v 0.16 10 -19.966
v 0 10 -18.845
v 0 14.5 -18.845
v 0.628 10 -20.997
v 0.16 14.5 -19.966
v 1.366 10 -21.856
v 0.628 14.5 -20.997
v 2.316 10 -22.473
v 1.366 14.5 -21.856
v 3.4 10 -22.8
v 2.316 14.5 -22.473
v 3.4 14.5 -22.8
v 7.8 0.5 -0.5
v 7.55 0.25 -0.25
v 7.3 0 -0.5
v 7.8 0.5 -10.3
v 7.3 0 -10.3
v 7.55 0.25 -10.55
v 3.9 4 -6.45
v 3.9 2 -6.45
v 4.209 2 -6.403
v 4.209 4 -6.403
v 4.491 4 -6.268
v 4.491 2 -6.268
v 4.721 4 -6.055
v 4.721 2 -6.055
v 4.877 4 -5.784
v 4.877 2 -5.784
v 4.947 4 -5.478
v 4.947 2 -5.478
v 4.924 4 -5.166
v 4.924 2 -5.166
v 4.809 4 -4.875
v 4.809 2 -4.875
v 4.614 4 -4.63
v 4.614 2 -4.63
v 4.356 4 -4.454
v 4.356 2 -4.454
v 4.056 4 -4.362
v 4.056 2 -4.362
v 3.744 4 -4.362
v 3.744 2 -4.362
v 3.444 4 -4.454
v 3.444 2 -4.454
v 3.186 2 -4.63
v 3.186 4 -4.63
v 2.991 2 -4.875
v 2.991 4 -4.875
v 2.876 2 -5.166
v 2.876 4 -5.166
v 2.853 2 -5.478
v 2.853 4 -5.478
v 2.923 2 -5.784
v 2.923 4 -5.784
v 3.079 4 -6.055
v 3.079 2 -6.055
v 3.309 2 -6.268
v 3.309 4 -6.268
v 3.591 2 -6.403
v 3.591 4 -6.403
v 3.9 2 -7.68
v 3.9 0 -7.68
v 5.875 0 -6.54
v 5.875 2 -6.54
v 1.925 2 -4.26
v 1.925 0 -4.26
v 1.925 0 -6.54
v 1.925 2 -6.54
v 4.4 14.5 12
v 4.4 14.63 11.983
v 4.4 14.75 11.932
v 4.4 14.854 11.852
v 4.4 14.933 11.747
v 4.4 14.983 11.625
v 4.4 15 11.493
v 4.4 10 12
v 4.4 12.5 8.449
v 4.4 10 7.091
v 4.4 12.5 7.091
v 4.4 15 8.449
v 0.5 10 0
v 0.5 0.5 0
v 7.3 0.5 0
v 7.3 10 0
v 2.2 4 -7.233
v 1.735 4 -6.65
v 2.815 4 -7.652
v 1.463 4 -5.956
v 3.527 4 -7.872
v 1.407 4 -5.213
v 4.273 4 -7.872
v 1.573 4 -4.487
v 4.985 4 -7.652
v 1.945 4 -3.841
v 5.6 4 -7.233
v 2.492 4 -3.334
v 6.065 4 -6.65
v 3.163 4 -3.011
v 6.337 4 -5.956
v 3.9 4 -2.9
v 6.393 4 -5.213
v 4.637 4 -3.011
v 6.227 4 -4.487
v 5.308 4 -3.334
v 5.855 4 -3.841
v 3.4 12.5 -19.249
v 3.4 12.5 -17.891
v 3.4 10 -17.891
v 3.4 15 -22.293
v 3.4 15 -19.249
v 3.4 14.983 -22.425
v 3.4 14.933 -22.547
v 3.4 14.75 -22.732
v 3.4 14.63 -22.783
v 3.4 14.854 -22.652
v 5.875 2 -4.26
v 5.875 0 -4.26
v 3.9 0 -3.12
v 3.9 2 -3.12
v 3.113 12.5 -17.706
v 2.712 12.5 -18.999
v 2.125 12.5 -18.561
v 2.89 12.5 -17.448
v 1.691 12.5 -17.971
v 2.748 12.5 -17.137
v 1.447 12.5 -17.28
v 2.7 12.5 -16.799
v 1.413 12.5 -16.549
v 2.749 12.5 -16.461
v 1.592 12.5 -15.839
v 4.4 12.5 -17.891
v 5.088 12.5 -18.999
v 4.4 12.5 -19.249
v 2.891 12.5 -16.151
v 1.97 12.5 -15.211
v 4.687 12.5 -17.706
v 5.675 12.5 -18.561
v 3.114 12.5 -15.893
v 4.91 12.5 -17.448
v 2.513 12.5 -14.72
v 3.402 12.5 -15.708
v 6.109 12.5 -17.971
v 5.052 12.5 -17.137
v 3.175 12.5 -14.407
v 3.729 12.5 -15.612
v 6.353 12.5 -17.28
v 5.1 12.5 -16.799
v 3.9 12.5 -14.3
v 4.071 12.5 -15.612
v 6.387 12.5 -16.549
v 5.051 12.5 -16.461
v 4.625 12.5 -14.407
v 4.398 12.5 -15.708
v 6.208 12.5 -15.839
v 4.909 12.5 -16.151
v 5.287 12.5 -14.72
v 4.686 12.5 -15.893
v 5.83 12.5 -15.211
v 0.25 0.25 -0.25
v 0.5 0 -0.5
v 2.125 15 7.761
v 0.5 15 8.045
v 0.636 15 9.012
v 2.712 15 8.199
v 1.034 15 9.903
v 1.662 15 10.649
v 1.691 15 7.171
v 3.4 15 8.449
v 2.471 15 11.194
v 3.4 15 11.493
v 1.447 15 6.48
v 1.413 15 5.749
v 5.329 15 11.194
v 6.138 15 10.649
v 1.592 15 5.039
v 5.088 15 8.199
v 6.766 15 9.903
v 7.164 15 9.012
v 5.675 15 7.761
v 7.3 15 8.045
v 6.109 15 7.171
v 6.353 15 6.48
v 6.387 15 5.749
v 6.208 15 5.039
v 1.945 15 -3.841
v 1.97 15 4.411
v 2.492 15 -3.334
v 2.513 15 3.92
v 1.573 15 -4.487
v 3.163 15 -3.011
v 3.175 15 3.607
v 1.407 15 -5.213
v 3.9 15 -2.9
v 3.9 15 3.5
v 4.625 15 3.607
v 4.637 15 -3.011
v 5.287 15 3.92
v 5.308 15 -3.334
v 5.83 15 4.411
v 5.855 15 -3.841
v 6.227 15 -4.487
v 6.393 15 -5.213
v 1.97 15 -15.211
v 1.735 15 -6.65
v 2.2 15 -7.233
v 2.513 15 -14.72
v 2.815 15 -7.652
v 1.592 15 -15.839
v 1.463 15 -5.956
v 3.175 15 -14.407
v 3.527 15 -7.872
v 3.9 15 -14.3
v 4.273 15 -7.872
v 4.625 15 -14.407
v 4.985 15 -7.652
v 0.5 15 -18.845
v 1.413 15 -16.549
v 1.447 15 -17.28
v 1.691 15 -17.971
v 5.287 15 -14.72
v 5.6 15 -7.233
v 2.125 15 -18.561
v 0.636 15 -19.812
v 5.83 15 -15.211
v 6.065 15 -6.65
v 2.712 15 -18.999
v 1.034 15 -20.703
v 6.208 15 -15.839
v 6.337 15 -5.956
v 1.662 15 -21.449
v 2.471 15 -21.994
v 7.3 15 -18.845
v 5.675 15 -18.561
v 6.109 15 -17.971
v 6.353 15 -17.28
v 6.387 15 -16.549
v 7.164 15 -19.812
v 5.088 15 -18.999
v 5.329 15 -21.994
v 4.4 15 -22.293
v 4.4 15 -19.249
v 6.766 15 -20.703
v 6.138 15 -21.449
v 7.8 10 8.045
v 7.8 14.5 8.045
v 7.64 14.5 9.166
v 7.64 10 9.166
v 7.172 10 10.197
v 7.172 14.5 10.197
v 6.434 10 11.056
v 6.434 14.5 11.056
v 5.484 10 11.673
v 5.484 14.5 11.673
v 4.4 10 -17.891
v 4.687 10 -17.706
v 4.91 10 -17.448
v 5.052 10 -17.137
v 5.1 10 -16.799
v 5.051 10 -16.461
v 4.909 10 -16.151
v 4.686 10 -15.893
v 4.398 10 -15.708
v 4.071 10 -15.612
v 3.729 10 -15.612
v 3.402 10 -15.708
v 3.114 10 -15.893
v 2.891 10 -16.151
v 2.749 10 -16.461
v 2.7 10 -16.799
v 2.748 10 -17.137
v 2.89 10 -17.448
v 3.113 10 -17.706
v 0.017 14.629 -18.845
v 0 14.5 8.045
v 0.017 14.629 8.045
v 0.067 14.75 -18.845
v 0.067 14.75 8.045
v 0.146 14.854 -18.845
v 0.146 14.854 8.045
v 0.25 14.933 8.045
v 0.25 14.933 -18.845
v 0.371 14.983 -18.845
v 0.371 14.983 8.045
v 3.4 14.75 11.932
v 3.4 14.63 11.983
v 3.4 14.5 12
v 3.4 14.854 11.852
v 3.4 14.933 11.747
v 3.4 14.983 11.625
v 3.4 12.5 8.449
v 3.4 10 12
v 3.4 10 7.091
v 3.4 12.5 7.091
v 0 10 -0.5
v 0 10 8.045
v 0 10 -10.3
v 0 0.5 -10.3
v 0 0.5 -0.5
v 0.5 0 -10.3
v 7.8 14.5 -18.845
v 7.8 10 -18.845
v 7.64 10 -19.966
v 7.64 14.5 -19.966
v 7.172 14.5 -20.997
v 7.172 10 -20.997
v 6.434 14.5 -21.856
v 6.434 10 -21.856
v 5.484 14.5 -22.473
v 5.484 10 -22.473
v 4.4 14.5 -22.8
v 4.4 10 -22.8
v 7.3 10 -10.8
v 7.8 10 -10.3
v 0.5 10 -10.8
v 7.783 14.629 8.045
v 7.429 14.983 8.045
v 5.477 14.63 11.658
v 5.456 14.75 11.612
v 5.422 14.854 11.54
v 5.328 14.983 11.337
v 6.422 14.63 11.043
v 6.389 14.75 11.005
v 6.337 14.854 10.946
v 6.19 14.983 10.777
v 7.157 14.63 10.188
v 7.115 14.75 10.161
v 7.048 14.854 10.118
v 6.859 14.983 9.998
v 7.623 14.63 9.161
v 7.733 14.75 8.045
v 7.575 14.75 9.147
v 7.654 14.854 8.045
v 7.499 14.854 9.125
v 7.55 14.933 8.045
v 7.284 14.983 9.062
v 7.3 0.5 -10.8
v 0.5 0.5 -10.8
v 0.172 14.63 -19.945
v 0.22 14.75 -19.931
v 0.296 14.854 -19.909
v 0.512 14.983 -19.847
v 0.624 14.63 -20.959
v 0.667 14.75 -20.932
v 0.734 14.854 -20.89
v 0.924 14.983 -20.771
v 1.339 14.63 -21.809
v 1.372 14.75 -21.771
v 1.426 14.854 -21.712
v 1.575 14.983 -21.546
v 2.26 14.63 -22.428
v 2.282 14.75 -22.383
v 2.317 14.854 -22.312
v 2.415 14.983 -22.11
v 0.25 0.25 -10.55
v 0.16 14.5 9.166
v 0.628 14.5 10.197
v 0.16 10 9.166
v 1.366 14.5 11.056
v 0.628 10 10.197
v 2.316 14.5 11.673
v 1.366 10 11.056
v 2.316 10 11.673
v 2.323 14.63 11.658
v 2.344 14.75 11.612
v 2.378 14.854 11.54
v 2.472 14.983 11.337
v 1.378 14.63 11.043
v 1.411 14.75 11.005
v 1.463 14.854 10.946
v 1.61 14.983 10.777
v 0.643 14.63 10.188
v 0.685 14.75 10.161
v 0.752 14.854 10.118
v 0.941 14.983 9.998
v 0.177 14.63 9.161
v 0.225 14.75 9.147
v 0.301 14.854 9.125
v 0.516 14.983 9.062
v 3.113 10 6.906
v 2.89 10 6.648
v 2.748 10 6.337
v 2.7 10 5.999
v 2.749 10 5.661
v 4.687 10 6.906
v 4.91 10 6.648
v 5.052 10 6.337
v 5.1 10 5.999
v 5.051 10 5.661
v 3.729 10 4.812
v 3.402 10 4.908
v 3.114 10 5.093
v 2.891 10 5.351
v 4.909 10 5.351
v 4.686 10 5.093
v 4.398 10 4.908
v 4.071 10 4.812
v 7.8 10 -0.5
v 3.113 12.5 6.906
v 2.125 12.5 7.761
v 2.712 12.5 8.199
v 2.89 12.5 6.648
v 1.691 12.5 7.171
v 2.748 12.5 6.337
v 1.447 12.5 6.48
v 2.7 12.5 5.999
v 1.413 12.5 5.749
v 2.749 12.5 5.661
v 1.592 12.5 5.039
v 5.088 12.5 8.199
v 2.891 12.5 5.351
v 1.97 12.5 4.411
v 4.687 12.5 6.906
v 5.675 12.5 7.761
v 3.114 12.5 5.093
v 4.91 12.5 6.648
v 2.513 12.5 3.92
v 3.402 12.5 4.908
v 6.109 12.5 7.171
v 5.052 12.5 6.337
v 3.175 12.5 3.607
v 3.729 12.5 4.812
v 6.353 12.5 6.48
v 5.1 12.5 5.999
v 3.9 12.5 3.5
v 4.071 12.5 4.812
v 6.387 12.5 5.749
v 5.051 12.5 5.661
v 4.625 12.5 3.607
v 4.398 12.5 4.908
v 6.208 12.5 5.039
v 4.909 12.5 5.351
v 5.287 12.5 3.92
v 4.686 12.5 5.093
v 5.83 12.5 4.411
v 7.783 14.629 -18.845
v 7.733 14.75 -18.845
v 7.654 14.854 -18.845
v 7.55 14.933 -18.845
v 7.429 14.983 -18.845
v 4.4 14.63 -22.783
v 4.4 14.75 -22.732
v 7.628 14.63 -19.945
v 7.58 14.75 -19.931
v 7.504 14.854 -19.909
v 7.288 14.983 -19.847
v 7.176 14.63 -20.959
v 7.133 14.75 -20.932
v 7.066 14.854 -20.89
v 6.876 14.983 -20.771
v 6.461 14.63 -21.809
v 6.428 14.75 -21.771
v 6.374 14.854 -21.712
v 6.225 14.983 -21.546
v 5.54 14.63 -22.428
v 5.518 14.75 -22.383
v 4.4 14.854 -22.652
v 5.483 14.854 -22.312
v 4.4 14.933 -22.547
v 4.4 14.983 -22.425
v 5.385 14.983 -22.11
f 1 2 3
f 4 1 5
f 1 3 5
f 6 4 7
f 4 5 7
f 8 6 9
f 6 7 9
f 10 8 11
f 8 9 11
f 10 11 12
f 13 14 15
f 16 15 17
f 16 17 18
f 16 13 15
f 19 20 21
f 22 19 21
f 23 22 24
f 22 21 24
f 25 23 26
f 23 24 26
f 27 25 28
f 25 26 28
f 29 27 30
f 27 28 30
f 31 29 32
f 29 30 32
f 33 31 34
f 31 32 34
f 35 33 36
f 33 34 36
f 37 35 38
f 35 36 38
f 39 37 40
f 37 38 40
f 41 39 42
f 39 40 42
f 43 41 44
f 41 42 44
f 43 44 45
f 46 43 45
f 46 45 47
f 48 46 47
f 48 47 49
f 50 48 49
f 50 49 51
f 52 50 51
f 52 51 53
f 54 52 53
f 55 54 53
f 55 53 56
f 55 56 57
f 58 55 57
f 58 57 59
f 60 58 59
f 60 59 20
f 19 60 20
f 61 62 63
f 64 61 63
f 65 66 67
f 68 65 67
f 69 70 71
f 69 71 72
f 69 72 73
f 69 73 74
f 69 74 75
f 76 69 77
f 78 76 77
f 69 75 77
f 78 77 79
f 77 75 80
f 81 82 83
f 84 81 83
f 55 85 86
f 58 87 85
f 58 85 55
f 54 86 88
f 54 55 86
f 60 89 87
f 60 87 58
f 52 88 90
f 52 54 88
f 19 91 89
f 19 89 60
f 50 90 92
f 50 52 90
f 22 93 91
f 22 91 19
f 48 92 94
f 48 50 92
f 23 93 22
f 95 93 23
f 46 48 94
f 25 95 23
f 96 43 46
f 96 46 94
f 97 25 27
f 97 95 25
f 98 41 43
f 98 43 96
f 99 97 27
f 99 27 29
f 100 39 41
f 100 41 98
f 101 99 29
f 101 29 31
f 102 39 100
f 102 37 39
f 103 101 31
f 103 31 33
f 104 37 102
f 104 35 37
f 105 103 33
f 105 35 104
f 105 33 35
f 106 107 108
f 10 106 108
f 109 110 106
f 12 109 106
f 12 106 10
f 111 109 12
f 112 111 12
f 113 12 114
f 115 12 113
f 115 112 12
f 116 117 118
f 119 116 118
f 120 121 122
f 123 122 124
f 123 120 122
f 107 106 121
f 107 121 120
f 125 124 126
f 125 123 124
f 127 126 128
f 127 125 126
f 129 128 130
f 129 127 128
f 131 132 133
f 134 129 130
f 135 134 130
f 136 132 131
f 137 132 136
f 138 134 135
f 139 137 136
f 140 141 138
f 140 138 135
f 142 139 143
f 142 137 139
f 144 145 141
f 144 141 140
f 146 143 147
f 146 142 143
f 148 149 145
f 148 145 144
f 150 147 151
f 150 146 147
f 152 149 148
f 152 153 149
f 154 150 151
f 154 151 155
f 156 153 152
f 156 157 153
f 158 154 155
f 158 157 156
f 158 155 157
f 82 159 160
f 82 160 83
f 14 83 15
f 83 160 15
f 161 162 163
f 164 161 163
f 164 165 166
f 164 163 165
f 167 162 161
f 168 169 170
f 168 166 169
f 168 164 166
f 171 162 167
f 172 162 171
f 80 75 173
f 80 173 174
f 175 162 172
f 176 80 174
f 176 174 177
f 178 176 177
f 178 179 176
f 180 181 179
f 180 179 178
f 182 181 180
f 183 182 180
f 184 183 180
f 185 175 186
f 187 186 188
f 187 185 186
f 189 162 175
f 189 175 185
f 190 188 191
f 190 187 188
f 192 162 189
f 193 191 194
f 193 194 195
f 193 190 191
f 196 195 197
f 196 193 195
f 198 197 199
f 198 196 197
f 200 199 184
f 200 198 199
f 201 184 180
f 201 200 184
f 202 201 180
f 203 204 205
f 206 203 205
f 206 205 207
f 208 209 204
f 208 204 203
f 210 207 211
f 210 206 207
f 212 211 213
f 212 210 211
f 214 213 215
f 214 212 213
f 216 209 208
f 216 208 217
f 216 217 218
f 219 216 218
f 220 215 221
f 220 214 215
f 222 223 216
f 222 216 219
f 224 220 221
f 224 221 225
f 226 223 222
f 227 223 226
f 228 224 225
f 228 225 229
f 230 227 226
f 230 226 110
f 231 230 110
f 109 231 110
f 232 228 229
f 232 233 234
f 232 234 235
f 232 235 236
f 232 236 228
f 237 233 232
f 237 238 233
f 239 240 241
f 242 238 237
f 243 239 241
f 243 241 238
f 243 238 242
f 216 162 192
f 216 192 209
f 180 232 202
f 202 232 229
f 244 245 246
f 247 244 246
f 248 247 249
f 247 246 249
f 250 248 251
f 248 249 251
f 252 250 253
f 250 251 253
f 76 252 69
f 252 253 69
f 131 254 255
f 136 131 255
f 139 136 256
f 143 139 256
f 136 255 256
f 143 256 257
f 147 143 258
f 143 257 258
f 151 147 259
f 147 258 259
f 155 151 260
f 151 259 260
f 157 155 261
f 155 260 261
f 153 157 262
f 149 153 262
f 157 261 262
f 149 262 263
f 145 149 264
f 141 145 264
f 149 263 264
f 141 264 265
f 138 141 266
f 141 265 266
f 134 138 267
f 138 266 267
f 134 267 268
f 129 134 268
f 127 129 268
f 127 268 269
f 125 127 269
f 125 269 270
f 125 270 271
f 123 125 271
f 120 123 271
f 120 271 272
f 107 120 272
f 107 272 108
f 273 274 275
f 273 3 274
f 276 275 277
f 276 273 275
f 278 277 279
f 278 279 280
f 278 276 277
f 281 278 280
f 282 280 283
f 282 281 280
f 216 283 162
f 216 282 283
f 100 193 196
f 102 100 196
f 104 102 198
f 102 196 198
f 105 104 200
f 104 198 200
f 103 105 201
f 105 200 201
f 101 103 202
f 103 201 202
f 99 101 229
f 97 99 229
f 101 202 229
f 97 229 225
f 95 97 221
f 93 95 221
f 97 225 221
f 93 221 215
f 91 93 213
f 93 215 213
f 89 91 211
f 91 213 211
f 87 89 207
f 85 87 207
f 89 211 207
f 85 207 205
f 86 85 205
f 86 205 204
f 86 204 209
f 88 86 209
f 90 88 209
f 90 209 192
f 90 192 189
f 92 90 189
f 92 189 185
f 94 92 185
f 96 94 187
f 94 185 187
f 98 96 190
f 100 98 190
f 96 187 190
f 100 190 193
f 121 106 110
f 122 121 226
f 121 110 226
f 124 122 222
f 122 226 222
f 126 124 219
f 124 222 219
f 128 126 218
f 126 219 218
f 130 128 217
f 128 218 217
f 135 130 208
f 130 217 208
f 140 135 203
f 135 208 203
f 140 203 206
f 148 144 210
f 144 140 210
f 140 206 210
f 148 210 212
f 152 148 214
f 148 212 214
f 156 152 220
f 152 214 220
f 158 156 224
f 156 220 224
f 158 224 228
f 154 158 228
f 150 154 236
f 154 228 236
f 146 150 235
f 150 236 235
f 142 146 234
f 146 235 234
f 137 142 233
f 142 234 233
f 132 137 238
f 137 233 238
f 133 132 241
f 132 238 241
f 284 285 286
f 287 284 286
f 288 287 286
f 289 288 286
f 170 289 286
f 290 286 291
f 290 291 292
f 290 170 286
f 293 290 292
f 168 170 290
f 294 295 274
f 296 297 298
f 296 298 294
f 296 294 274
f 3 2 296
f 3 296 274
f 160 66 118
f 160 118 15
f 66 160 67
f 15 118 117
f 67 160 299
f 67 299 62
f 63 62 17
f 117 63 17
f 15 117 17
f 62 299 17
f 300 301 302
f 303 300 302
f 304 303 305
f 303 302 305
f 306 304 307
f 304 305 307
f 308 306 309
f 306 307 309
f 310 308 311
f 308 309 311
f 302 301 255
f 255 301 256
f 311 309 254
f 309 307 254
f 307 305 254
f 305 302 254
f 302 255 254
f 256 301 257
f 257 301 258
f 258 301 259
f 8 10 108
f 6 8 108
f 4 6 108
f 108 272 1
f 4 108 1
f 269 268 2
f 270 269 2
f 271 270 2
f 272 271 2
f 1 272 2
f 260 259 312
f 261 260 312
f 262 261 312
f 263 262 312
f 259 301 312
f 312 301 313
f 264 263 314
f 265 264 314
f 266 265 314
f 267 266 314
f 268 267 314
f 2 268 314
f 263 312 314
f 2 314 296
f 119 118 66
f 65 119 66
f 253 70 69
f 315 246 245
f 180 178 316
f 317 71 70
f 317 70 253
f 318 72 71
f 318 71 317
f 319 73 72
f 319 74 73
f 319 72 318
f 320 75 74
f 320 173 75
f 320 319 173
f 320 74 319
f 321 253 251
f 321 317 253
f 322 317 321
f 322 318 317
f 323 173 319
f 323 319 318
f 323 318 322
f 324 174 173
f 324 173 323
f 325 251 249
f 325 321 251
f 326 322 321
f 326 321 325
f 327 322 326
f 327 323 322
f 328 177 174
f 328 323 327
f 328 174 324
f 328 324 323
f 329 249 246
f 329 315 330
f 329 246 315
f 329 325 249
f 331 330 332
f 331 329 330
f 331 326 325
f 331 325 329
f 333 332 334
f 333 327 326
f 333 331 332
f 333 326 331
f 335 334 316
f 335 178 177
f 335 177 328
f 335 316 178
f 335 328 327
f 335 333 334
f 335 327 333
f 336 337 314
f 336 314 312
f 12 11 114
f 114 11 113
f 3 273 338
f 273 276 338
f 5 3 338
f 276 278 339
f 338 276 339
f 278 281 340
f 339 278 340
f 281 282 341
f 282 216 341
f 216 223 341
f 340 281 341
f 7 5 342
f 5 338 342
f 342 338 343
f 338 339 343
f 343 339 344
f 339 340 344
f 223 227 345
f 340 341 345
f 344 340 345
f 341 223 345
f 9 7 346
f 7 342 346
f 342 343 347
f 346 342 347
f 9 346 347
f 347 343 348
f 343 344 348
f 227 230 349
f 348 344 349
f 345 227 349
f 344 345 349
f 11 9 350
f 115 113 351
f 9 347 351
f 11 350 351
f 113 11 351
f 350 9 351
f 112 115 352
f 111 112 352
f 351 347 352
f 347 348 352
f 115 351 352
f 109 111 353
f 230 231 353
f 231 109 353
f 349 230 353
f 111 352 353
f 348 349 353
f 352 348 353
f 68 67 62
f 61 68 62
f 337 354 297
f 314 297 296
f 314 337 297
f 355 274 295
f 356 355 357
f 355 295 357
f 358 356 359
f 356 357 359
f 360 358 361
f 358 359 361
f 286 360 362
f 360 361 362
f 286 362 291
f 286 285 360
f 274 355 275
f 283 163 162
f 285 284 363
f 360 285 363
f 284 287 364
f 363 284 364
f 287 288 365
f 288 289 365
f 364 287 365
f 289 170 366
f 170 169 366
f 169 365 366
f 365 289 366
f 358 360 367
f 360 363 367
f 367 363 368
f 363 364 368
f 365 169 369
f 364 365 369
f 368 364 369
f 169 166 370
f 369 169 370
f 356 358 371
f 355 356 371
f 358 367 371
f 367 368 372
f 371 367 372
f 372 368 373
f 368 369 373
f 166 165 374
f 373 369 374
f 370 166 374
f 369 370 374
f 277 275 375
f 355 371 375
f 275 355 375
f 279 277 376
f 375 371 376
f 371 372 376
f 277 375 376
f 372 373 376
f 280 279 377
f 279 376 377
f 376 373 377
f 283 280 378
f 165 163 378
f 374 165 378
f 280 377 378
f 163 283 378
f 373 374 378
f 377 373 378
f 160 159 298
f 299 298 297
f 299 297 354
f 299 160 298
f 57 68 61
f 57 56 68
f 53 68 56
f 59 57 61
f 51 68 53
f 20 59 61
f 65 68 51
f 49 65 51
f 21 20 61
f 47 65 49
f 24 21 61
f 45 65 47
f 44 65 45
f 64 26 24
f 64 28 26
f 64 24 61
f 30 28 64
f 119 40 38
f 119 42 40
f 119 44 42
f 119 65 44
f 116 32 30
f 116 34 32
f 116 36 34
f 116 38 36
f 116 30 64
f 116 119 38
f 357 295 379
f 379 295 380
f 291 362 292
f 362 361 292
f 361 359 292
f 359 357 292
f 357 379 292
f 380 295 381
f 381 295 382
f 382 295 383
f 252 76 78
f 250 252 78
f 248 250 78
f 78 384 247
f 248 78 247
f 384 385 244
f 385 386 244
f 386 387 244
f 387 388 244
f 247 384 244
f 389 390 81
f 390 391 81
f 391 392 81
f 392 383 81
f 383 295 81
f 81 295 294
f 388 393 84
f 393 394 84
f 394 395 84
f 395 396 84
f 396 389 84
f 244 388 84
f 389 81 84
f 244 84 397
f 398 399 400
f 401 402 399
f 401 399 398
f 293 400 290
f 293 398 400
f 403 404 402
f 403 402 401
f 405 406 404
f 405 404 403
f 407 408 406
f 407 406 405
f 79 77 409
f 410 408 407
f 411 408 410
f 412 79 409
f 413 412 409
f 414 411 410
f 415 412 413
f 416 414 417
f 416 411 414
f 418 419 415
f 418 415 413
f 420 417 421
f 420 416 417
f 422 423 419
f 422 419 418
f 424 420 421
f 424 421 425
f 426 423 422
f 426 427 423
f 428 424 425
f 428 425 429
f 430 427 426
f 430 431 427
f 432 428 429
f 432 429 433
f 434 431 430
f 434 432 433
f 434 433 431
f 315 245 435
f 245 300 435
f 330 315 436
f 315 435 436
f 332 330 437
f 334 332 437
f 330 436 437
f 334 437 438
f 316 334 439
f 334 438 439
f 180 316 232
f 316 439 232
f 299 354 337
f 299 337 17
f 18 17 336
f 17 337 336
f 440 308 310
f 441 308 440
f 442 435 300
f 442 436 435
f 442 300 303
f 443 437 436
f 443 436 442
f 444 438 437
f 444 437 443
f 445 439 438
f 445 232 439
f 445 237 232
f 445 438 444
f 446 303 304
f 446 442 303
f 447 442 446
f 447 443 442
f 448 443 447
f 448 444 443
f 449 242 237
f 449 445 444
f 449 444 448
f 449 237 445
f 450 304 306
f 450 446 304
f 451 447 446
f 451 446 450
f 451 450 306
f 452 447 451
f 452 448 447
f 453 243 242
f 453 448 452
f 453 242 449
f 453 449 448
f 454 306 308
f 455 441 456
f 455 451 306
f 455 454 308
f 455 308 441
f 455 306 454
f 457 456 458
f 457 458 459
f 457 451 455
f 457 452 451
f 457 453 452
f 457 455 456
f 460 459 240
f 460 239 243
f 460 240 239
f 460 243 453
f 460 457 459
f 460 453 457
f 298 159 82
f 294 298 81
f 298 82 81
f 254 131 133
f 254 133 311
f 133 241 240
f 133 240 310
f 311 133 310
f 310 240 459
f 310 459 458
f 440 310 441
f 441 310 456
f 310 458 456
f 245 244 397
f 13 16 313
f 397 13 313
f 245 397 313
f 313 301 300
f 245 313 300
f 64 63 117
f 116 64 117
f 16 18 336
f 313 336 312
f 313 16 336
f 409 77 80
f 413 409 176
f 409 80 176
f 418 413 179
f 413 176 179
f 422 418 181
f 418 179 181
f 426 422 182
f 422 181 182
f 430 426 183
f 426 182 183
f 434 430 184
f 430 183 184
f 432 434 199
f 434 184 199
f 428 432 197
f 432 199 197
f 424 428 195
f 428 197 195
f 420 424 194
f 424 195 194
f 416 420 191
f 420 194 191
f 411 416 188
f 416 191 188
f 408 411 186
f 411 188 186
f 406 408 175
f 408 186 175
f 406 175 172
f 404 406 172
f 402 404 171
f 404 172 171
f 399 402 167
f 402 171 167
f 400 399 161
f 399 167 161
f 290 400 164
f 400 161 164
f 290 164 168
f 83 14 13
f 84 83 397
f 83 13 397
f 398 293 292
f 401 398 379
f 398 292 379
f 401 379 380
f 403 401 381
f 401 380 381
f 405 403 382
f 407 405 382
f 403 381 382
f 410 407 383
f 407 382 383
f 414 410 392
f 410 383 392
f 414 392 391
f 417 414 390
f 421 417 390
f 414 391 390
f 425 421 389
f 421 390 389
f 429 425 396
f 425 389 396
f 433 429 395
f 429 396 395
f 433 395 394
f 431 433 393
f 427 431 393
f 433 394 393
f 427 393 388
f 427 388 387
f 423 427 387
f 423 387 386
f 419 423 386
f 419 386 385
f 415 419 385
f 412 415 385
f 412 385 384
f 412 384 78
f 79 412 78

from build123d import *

# Parameters (mm, degrees)
ESQUISSE1_W             = 7.8
ESQUISSE1_H             = 10.8
BOSS_EXTRU_1_DEPTH      = 15
ESQUISSE6_R             = 1.05
ENL_V_MAT_EXTRU_2_DEPTH = 21.061904197
ENL_V_MAT_EXTRU_3_DEPTH = 2
ESQUISSE8_R             = 2.5
ENL_V_MAT_EXTRU_4_DEPTH = 11
ESQUISSE9_W             = 7.8
ESQUISSE9_H             = 5
BOSS_EXTRU_2_DEPTH      = 12
ESQUISSE10_W            = 7.8
ESQUISSE10_H            = 5
BOSS_EXTRU_3_DEPTH      = 12
ESQUISSE11_R            = 1.2
ENL_V_MAT_EXTRU_5_DEPTH = 27.089844768
ESQUISSE15_W            = 1
ESQUISSE15_H            = 4.909128789
ENL_V_MAT_EXTRU_6_DEPTH = 29.384502814
ESQUISSE16_R            = 2.5
ENL_V_MAT_EXTRU_7_DEPTH = 2.5
ESQUISSE17_W            = 1
ESQUISSE17_H            = 4.91
ENL_V_MAT_EXTRU_8_DEPTH = 10
CONG_3_R                = 4
CHANFREIN1_SIZE         = 0.5
CHANFREIN2_SIZE         = 0.5
CONG_5_R                = 0.5


with BuildPart() as part:
    # Esquisse1 → Boss.-Extru.1 (new body)
    with BuildSketch(Plane(origin=(0, 0, 0), x_dir=(1, 0, 0), z_dir=(0, 1, 0))):
        with Locations((3.9, 5.4)):
            Rectangle(ESQUISSE1_W, ESQUISSE1_H)
    extrude(amount=BOSS_EXTRU_1_DEPTH)

    # Esquisse6 → Enlèv. mat.-Extru.2 (cut, through all)
    with BuildSketch(Plane.XZ):
        with Locations(Location((3.9, -5.4, 0), (0, 0, 270))):
            Circle(ESQUISSE6_R)
    extrude(amount=-ENL_V_MAT_EXTRU_2_DEPTH, mode=Mode.SUBTRACT)

    # Esquisse7 → Enlèv. mat.-Extru.3 (cut)
    with BuildSketch(Plane.XZ):
        Polygon((3.9, -7.68), (5.874537921, -6.54), (5.874537921, -4.26), (3.9, -3.12), (1.925462079, -4.26), (1.925462079, -6.54), align=None)
    extrude(amount=-ENL_V_MAT_EXTRU_3_DEPTH, mode=Mode.SUBTRACT)

    # Esquisse8 → Enlèv. mat.-Extru.4 (cut)
    with BuildSketch(Plane(origin=(0, 15, 0), x_dir=(1, 0, 0), z_dir=(0, 1, 0))):
        with Locations(Location((3.9, 5.4, 0), (0, 0, 270))):
            Circle(ESQUISSE8_R)
    extrude(amount=-ENL_V_MAT_EXTRU_4_DEPTH, mode=Mode.SUBTRACT)

    # Esquisse9 → Boss.-Extru.2 (add)
    with BuildSketch(Plane(origin=(0, 0, -10.8), x_dir=(-1, 0, 0), z_dir=(0, 0, -1))):
        with Locations((-3.9, 12.5)):
            Rectangle(ESQUISSE9_W, ESQUISSE9_H)
    extrude(amount=BOSS_EXTRU_2_DEPTH)

    # Esquisse10 → Boss.-Extru.3 (add)
    with BuildSketch(Plane.XY):
        with Locations((3.9, 12.5)):
            Rectangle(ESQUISSE10_W, ESQUISSE10_H)
    extrude(amount=BOSS_EXTRU_3_DEPTH)

    # Esquisse11 → Enlèv. mat.-Extru.5 (cut, through all)
    with BuildSketch(Plane.XZ.offset(-10)):
        with Locations(Location((3.9, -16.8, 0), (0, 0, 270))):
            Circle(ESQUISSE11_R)
        with Locations(Location((3.9, 6, 0), (0, 0, 270))):
            Circle(ESQUISSE11_R)
    extrude(amount=-ENL_V_MAT_EXTRU_5_DEPTH, mode=Mode.SUBTRACT)

    # Esquisse15 → Enlèv. mat.-Extru.6 (cut, through all)
    with BuildSketch(Plane(origin=(0, 15, 0), x_dir=(1, 0, 0), z_dir=(0, 1, 0))):
        with Locations((3.9, -9.545435605)):
            Rectangle(ESQUISSE15_W, ESQUISSE15_H)
    extrude(amount=-ENL_V_MAT_EXTRU_6_DEPTH, mode=Mode.SUBTRACT)

    # Esquisse16 → Enlèv. mat.-Extru.7 (cut)
    with BuildSketch(Plane(origin=(0, 15, 0), x_dir=(1, 0, 0), z_dir=(0, 1, 0))):
        with Locations(Location((3.9, 16.8, 0), (0, 0, 270))):
            Circle(ESQUISSE16_R)
        with Locations((3.9, -6)):
            Circle(ESQUISSE16_R)
    extrude(amount=-ENL_V_MAT_EXTRU_7_DEPTH, mode=Mode.SUBTRACT)

    # Esquisse17 → Enlèv. mat.-Extru.8 (cut)
    with BuildSketch(Plane(origin=(0, 15, 0), x_dir=(1, 0, 0), z_dir=(0, 1, 0))):
        with Locations((3.9, 20.345)):
            Rectangle(ESQUISSE17_W, ESQUISSE17_H)
    extrude(amount=-ENL_V_MAT_EXTRU_8_DEPTH, mode=Mode.SUBTRACT)

    # Congé3
    # the kernel refuses this fillet: 4 mm, written as the material it takes off along each edge
    with BuildSketch(Plane(origin=(7.8, 24.886859967, 12), x_dir=(-1, 0, 0), z_dir=(0, -1, 0)), Plane(origin=(7.8, 0.113140033, -22.8), x_dir=(-1, 0, 0), z_dir=(0, 1, 0))) as cong_3_piece_1:
        with BuildLine():
            CenterArc((4, 3.954743987), CONG_3_R, 180, 81.373073441)
            Line((0, 3.954743987), (-0.08, 3.954743987))
            Line((-0.08, 3.954743987), (-0.08, 0))
            Line((-0.08, 0), (0, -0.08))
            ThreePointArc((0, -0.08), (1.7, -0.08), (3.388, -0.07909488))
            Line((3.388, -0.07909488), (3.4, 0))
        make_face()
    extrude(amount=24.773719933, mode=Mode.SUBTRACT)
    with BuildSketch(Plane(origin=(0, 0.113140033, 12), x_dir=(0, 0, -1), z_dir=(0, 1, 0)), Plane(origin=(0, 24.886859967, -22.8), x_dir=(0, 0, 1), z_dir=(0, -1, 0))) as cong_3_piece_2:
        with BuildLine():
            CenterArc((3.954743987, -4), CONG_3_R, 90, 81.373073441)
            Line((0, -3.4), (-0.07909488, -3.388))
            ThreePointArc((-0.07909488, -3.388), (-0.08, -1.7), (-0.08, 0))
            Line((-0.08, 0), (0, 0.08))
            Line((0, 0.08), (3.954743987, 0.08))
            Line((3.954743987, 0.08), (3.954743987, 0))
        make_face()
    extrude(amount=24.773719933, mode=Mode.SUBTRACT)

    # Chanfrein1
    chanfrein1_edges = [part.edges().sort_by_distance(p)[0] for p in [
        (3.9, 0, -10.8),
        (7.8, 0, -5.4),
        (3.9, 0, 0),
        (0, 0, -5.4),
    ]]
    chamfer(chanfrein1_edges, length=CHANFREIN1_SIZE)

    # Chanfrein2
    chanfrein2_edges = [part.edges().sort_by_distance(p)[0] for p in [
        (0, 5.25, -10.8),
        (7.8, 5.25, -10.8),
        (7.8, 5.25, 0),
        (0, 5.25, 0),
    ]]
    chamfer(chanfrein2_edges, length=CHANFREIN2_SIZE)

    # Congé5
    cong_5_edges = [part.edges().sort_by_distance(p)[0] for p in [
        (0, 15, -5.4),
        (7.8, 15, -5.4),
        (0.966849822, 15, -21.452936975),
        (0.966849822, 15, 10.652936975),
        (6.833150178, 15, -21.452936975),
        (6.833150178, 15, 10.652936975),
    ]]
    fillet(cong_5_edges, radius=CONG_5_R)


solid = part.part
